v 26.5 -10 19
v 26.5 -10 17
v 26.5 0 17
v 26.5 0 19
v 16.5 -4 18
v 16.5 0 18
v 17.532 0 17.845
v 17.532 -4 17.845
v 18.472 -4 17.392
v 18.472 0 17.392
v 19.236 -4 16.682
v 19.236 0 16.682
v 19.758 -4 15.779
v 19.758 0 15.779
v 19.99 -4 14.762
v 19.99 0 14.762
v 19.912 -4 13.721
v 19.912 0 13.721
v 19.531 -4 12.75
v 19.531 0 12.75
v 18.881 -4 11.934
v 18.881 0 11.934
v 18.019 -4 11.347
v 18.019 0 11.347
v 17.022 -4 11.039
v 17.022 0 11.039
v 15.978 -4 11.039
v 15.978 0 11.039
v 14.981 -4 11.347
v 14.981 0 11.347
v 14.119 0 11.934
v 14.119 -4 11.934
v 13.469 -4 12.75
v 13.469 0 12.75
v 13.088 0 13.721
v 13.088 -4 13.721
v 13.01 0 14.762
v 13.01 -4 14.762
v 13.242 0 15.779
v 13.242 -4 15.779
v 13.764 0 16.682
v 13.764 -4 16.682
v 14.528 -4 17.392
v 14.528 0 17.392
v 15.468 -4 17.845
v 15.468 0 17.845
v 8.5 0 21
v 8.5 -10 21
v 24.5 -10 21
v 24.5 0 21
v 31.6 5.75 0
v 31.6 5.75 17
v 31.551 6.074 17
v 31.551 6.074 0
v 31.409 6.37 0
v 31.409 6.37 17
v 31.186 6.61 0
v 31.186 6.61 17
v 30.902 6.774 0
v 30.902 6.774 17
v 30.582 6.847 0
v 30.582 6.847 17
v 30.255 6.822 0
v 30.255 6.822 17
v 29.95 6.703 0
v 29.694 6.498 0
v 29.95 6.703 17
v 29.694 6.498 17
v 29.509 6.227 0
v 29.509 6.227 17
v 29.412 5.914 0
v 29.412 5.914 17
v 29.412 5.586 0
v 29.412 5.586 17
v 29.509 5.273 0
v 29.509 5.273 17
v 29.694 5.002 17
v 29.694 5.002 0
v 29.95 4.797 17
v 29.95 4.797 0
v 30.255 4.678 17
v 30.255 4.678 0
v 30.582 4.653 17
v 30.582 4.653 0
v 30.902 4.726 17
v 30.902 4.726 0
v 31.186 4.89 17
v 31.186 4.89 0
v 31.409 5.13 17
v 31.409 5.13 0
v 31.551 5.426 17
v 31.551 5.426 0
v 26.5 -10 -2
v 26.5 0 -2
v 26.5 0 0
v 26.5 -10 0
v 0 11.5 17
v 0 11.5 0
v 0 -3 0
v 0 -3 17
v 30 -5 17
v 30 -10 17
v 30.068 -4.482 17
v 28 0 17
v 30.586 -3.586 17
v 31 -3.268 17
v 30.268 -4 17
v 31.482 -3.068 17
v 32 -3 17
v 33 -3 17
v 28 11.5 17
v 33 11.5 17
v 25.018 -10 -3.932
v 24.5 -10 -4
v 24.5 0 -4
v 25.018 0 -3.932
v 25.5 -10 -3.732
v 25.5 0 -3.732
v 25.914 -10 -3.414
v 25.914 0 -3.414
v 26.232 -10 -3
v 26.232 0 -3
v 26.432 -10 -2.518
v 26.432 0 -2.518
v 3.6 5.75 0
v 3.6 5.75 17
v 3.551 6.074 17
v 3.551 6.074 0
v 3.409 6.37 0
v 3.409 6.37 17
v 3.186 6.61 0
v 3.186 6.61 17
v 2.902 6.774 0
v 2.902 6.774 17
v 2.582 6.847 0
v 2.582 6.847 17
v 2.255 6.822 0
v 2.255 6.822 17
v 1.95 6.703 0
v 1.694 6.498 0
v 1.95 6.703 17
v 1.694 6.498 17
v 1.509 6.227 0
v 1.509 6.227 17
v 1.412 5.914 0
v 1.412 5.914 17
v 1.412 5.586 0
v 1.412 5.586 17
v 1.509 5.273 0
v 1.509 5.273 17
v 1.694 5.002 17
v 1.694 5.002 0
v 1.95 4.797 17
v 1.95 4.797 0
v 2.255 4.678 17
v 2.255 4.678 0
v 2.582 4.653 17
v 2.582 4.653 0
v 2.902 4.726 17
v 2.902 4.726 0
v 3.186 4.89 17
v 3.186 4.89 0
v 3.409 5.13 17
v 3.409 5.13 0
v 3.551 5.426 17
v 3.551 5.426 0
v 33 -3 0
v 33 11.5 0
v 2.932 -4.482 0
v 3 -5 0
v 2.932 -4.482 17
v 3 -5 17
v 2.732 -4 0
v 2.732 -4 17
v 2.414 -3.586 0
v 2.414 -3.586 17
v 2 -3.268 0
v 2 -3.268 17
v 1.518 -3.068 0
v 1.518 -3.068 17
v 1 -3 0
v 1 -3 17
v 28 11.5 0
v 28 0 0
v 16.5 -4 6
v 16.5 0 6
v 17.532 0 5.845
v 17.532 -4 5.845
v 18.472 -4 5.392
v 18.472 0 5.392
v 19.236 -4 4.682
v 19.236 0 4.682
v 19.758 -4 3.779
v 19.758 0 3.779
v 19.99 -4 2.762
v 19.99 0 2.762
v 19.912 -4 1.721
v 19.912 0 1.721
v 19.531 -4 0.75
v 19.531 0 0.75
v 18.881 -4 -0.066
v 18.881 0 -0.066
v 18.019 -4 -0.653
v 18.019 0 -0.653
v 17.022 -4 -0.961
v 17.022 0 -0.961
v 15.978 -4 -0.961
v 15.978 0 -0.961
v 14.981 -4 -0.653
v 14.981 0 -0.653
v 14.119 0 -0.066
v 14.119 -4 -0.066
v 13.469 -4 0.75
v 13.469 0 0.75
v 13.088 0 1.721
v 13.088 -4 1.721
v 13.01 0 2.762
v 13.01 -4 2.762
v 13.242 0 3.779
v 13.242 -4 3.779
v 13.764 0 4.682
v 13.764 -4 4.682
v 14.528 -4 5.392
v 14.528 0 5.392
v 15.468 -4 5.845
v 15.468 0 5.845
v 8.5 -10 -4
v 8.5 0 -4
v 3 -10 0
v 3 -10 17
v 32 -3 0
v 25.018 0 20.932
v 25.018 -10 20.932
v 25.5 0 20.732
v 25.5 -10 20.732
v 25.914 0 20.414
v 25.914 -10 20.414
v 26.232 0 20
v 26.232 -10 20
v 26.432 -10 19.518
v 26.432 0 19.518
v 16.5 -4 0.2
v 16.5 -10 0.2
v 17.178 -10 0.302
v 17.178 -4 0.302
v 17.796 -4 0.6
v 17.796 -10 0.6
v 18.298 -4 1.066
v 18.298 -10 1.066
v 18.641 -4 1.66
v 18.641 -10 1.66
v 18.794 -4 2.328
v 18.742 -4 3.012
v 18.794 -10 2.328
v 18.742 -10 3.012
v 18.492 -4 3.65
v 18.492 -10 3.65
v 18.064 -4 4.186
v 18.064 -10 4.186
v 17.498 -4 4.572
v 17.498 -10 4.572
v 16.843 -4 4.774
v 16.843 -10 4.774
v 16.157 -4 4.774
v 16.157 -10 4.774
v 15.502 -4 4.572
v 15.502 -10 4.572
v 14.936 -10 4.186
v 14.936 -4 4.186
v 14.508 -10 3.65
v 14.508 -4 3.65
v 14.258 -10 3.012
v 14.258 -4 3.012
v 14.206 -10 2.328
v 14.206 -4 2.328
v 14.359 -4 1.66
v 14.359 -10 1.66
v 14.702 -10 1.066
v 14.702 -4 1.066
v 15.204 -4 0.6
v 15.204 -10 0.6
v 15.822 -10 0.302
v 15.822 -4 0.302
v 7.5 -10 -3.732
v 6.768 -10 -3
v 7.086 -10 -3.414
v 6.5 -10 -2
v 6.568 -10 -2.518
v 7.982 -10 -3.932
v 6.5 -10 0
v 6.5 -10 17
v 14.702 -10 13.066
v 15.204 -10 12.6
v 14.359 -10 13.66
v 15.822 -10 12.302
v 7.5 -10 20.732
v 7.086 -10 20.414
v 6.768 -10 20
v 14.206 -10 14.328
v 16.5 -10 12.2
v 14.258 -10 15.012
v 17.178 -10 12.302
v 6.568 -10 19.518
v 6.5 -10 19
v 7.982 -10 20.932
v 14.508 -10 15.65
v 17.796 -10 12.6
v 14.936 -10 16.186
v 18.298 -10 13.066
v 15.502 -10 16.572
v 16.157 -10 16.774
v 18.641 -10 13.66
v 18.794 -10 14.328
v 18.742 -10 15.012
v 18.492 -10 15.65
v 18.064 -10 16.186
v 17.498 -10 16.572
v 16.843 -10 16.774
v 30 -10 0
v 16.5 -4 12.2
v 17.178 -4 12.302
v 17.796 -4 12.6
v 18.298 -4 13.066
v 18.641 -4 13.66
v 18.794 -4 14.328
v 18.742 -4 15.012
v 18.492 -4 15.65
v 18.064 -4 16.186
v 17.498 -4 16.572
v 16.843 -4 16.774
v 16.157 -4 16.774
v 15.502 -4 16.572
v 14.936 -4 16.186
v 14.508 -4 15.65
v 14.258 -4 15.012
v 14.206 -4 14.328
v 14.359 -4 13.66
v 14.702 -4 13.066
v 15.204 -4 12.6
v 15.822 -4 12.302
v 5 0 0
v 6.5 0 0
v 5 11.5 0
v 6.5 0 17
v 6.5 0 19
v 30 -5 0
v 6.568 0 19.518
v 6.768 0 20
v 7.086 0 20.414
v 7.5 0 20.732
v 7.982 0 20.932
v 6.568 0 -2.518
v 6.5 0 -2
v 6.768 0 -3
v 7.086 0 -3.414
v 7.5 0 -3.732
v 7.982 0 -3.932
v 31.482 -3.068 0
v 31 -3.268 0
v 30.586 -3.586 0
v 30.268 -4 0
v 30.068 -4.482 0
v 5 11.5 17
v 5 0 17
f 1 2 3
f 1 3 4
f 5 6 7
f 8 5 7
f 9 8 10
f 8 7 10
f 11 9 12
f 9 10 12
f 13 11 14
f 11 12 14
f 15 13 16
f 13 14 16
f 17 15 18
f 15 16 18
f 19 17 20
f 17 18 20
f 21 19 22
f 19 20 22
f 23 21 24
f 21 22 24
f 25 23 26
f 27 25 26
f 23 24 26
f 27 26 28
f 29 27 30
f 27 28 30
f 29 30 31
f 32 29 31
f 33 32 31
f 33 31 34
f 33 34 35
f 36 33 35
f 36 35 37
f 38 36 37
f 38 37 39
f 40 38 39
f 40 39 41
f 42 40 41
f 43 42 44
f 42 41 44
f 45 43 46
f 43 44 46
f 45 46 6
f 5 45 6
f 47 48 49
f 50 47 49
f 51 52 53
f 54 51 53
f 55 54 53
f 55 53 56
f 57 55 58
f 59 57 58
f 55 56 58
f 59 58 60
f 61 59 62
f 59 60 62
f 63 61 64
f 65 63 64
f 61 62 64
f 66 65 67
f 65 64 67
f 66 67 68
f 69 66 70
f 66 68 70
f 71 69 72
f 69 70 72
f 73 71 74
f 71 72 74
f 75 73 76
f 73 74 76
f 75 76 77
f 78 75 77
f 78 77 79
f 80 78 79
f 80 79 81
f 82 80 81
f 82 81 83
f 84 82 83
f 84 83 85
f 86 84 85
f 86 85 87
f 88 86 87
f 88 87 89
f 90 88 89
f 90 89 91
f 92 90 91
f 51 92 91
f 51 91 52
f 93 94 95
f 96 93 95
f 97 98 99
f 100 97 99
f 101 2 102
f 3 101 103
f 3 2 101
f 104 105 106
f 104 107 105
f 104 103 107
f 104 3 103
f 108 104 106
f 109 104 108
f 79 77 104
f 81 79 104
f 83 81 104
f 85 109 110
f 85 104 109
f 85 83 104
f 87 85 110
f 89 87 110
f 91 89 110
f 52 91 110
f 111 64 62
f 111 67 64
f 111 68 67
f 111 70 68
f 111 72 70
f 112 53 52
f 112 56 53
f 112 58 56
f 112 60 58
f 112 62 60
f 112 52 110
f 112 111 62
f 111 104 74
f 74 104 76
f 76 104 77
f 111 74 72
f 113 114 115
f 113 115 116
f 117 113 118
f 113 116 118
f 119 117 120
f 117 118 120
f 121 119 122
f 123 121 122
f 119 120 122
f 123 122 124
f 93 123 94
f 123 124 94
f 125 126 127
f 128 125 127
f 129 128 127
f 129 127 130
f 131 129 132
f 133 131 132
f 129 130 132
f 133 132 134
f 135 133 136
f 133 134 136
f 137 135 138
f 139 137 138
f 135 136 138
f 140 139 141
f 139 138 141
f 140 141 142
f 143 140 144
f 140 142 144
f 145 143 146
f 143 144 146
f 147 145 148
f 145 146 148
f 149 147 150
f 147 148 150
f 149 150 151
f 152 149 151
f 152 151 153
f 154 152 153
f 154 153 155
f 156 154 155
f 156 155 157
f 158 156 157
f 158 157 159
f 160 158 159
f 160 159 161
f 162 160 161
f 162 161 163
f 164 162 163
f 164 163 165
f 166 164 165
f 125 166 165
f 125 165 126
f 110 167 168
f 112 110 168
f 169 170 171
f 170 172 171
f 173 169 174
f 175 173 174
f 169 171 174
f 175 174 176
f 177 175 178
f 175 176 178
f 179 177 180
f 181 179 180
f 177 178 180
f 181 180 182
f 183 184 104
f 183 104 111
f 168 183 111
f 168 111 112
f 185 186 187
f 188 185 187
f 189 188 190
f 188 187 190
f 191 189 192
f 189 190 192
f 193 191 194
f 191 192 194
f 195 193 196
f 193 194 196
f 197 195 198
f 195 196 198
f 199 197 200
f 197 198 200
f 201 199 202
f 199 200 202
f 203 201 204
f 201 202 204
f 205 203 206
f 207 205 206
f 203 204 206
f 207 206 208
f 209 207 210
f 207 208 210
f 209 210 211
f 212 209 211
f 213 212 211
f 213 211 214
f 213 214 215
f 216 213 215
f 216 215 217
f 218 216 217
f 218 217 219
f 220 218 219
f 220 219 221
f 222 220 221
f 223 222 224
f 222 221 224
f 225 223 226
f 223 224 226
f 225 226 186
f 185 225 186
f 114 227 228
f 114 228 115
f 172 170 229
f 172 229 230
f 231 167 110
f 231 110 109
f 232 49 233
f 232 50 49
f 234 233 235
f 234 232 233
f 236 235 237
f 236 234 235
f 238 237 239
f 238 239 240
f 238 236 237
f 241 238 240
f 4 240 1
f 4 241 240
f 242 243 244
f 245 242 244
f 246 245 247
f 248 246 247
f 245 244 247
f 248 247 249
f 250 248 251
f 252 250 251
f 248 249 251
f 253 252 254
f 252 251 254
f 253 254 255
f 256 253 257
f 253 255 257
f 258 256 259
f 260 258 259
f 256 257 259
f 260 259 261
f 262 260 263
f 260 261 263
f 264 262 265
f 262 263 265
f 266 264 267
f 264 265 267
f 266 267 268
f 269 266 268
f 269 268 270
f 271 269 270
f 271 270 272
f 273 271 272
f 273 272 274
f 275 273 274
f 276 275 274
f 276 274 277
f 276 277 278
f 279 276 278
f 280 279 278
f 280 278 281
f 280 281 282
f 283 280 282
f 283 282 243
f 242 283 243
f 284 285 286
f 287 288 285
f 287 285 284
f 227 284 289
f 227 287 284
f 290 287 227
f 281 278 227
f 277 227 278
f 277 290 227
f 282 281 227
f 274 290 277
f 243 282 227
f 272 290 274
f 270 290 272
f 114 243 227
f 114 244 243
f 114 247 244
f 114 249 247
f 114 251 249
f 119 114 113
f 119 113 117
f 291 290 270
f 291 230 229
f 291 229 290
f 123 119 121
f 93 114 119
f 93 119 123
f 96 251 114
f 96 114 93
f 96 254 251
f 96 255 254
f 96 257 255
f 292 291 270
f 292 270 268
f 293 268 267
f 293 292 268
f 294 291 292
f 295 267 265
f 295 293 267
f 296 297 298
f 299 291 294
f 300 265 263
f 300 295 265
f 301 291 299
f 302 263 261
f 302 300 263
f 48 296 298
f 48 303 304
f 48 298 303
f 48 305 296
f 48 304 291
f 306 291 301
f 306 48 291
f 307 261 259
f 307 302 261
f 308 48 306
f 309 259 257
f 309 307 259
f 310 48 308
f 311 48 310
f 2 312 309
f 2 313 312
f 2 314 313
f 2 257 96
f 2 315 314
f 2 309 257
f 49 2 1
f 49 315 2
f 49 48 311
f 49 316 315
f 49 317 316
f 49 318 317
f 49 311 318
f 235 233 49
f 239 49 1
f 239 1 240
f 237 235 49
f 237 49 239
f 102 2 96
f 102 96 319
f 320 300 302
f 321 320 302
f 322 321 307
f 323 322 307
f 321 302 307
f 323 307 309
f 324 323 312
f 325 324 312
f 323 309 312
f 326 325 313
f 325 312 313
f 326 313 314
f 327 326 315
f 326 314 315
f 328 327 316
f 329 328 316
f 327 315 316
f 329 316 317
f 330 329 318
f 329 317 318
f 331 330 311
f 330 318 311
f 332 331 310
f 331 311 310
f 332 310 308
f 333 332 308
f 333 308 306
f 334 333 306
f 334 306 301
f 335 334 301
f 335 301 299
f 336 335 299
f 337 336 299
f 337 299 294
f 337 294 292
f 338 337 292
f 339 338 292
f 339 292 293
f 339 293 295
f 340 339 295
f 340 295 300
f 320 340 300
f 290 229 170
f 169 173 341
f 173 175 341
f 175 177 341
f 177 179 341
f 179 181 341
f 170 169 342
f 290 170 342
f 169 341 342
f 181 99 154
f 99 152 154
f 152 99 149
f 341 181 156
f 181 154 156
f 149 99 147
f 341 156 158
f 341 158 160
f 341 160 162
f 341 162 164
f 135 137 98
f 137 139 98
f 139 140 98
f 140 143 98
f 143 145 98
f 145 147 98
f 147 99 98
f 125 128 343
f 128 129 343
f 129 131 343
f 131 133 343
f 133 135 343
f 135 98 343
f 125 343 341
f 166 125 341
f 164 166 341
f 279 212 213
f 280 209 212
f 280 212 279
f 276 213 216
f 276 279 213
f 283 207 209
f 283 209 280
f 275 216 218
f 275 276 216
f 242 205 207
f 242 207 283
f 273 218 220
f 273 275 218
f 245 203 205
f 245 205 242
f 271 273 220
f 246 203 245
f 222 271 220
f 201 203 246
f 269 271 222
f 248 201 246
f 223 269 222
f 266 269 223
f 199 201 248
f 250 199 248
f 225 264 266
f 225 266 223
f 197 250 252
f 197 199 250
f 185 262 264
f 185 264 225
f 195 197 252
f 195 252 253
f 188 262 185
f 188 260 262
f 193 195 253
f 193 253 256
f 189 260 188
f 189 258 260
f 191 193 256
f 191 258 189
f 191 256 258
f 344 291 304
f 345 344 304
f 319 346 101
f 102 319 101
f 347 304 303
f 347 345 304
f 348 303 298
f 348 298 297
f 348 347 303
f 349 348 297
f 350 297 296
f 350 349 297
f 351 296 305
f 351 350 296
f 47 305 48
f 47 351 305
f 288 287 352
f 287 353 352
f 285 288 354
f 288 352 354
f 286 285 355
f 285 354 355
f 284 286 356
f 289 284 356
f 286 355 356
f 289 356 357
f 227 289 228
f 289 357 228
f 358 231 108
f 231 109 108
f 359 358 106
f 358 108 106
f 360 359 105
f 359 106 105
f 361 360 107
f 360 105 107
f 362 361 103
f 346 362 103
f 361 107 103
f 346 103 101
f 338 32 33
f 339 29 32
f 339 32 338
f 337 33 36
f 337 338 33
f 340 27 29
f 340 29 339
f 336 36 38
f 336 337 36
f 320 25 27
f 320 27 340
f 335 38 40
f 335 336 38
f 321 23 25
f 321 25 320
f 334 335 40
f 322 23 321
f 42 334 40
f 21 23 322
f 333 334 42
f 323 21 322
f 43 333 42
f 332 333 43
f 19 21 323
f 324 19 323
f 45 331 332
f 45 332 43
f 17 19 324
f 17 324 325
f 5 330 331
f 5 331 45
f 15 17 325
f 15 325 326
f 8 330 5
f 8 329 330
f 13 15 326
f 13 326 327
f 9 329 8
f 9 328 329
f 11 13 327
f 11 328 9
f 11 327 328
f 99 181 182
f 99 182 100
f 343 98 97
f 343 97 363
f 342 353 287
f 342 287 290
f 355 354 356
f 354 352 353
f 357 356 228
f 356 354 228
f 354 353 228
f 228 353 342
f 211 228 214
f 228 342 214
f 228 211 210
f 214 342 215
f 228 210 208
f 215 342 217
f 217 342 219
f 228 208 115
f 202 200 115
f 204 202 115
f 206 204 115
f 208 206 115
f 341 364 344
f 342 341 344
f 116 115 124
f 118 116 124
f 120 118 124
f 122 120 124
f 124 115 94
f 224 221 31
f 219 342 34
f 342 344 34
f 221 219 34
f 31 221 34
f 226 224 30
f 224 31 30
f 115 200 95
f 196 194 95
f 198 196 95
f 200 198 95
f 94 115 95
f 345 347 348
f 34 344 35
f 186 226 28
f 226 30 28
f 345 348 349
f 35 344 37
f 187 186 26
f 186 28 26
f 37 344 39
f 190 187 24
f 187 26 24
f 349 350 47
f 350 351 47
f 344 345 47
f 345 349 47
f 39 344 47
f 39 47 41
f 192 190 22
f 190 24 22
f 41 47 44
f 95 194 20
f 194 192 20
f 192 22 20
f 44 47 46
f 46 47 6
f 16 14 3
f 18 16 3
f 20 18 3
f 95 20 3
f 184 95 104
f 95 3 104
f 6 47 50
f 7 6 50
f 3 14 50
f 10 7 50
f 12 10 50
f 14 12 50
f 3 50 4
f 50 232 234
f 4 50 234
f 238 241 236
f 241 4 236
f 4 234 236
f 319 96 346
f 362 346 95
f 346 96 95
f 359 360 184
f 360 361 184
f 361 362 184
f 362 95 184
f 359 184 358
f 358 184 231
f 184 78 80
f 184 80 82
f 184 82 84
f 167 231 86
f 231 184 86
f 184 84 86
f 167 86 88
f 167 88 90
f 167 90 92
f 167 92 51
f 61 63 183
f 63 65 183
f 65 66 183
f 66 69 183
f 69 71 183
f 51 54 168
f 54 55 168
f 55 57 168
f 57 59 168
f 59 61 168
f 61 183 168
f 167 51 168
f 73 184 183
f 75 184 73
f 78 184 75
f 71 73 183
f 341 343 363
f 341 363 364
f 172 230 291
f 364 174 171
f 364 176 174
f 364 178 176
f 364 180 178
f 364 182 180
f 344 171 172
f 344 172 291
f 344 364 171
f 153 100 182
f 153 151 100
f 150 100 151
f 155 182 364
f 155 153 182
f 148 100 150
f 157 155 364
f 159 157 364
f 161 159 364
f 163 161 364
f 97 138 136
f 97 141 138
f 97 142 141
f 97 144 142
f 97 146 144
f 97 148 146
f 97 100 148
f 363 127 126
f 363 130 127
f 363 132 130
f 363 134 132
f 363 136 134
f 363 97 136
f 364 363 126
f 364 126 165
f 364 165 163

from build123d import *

# Parameters (mm, degrees)
SALIENTE_EXTRUIR1_DEPTH = 17
CROQUIS4_R              = 2.5
CORTAR_EXTRUIR2_DEPTH   = 5
CROQUIS5_W              = 27
CROQUIS5_H              = 17
CROQUIS5_R              = 2.5
SALIENTE_EXTRUIR4_DEPTH = 7
REDONDEO2_R             = 2
CROQUIS6_R              = 3.5
CORTAR_EXTRUIR3_DEPTH   = 1
CROQUIS9_R              = 3.5
SALIENTE_EXTRUIR7_DEPTH = 10
CROQUIS10_W             = 20
CROQUIS10_H             = 25
SALIENTE_EXTRUIR8_DEPTH = 10
CROQUIS11_R             = 2.3
CORTAR_EXTRUIR6_DEPTH   = 10
CROQUIS12_R             = 3.5
CORTAR_EXTRUIR7_DEPTH   = 4
REDONDEO3_R             = 2
CROQUIS8_R              = 1.1
CORTAR_EXTRUIR8_DEPTH   = 41.770700264


with BuildPart() as part:
    # Croquis2 → Saliente-Extruir1 (new body)
    with BuildSketch(Plane.XY):
        Polygon((0, 0), (0, 11.5), (5, 11.5), (5, 0), (28, 0), (28, 11.5), (33, 11.5), (33, 0), (33, -3), (0, -3), align=None)
    extrude(amount=SALIENTE_EXTRUIR1_DEPTH)

    # Croquis4 → Cortar-Extruir2 (cut)
    with BuildSketch(Plane(origin=(0, 0, 0), x_dir=(1, 0, 0), z_dir=(0, 1, 0))):
        with Locations((9, -8.5)):
            Circle(CROQUIS4_R)
        with Locations((24, -8.5)):
            Circle(CROQUIS4_R)
    extrude(amount=-CORTAR_EXTRUIR2_DEPTH, mode=Mode.SUBTRACT)

    # Croquis5 → Saliente-Extruir4 (add)
    with BuildSketch(Plane.XZ.offset(3)):
        with Locations((16.5, 8.5)):
            Rectangle(CROQUIS5_W, CROQUIS5_H)
        with Locations((9, 8.5)):
            Circle(CROQUIS5_R, mode=Mode.SUBTRACT)
        with Locations((24, 8.5)):
            Circle(CROQUIS5_R, mode=Mode.SUBTRACT)
    extrude(amount=SALIENTE_EXTRUIR4_DEPTH)

    # Redondeo2
    redondeo2_edges = [part.edges().sort_by_distance(p)[0] for p in [
        (3, -3, 8.5),
        (30, -3, 8.5),
    ]]
    fillet(redondeo2_edges, radius=REDONDEO2_R)

    # Croquis6 → Cortar-Extruir3 (cut)
    with BuildSketch(Plane(origin=(0, 0, 0), x_dir=(1, 0, 0), z_dir=(0, 1, 0))):
        with Locations((9, -8.5)):
            Circle(CROQUIS6_R)
        with Locations((24, -8.5)):
            Circle(CROQUIS6_R)
    extrude(amount=-CORTAR_EXTRUIR3_DEPTH, mode=Mode.SUBTRACT)

    # Croquis9 → Saliente-Extruir7 (add)
    with BuildSketch(Plane(origin=(0, 0, 0), x_dir=(1, 0, 0), z_dir=(0, 1, 0))):
        with Locations((9, -8.5)):
            Circle(CROQUIS9_R)
        with Locations((24, -8.5)):
            Circle(CROQUIS9_R)
    extrude(amount=-SALIENTE_EXTRUIR7_DEPTH)

    # Croquis10 → Saliente-Extruir8 (add)
    with BuildSketch(Plane.XZ.offset(10)):
        with Locations((16.5, 8.5)):
            Rectangle(CROQUIS10_W, CROQUIS10_H)
    extrude(amount=-SALIENTE_EXTRUIR8_DEPTH)

    # Croquis11 → Cortar-Extruir6 (cut)
    with BuildSketch(Plane.XZ.offset(10)):
        with Locations((16.5, 14.5)):
            Circle(CROQUIS11_R)
        with Locations((16.5, 2.5)):
            Circle(CROQUIS11_R)
    extrude(amount=-CORTAR_EXTRUIR6_DEPTH, mode=Mode.SUBTRACT)

    # Croquis12 → Cortar-Extruir7 (cut)
    with BuildSketch(Plane(origin=(0, 0, 0), x_dir=(1, 0, 0), z_dir=(0, 1, 0))):
        with Locations((16.5, -2.5)):
            Circle(CROQUIS12_R)
        with Locations((16.5, -14.5)):
            Circle(CROQUIS12_R)
    extrude(amount=-CORTAR_EXTRUIR7_DEPTH, mode=Mode.SUBTRACT)

    # Redondeo3
    redondeo3_edges = [part.edges().sort_by_distance(p)[0] for p in [
        (26.5, -5, -4),
        (6.5, -5, -4),
        (6.5, -5, 21),
        (26.5, -5, 21),
    ]]
    fillet(redondeo3_edges, radius=REDONDEO3_R)

    # Croquis8 → Cortar-Extruir8 (cut, through all)
    with BuildSketch(Plane.XY.offset(17)):
        with Locations((2.5, 5.75)):
            Circle(CROQUIS8_R)
        with Locations((30.5, 5.75)):
            Circle(CROQUIS8_R)
    extrude(amount=-CORTAR_EXTRUIR8_DEPTH, mode=Mode.SUBTRACT)


solid = part.part
